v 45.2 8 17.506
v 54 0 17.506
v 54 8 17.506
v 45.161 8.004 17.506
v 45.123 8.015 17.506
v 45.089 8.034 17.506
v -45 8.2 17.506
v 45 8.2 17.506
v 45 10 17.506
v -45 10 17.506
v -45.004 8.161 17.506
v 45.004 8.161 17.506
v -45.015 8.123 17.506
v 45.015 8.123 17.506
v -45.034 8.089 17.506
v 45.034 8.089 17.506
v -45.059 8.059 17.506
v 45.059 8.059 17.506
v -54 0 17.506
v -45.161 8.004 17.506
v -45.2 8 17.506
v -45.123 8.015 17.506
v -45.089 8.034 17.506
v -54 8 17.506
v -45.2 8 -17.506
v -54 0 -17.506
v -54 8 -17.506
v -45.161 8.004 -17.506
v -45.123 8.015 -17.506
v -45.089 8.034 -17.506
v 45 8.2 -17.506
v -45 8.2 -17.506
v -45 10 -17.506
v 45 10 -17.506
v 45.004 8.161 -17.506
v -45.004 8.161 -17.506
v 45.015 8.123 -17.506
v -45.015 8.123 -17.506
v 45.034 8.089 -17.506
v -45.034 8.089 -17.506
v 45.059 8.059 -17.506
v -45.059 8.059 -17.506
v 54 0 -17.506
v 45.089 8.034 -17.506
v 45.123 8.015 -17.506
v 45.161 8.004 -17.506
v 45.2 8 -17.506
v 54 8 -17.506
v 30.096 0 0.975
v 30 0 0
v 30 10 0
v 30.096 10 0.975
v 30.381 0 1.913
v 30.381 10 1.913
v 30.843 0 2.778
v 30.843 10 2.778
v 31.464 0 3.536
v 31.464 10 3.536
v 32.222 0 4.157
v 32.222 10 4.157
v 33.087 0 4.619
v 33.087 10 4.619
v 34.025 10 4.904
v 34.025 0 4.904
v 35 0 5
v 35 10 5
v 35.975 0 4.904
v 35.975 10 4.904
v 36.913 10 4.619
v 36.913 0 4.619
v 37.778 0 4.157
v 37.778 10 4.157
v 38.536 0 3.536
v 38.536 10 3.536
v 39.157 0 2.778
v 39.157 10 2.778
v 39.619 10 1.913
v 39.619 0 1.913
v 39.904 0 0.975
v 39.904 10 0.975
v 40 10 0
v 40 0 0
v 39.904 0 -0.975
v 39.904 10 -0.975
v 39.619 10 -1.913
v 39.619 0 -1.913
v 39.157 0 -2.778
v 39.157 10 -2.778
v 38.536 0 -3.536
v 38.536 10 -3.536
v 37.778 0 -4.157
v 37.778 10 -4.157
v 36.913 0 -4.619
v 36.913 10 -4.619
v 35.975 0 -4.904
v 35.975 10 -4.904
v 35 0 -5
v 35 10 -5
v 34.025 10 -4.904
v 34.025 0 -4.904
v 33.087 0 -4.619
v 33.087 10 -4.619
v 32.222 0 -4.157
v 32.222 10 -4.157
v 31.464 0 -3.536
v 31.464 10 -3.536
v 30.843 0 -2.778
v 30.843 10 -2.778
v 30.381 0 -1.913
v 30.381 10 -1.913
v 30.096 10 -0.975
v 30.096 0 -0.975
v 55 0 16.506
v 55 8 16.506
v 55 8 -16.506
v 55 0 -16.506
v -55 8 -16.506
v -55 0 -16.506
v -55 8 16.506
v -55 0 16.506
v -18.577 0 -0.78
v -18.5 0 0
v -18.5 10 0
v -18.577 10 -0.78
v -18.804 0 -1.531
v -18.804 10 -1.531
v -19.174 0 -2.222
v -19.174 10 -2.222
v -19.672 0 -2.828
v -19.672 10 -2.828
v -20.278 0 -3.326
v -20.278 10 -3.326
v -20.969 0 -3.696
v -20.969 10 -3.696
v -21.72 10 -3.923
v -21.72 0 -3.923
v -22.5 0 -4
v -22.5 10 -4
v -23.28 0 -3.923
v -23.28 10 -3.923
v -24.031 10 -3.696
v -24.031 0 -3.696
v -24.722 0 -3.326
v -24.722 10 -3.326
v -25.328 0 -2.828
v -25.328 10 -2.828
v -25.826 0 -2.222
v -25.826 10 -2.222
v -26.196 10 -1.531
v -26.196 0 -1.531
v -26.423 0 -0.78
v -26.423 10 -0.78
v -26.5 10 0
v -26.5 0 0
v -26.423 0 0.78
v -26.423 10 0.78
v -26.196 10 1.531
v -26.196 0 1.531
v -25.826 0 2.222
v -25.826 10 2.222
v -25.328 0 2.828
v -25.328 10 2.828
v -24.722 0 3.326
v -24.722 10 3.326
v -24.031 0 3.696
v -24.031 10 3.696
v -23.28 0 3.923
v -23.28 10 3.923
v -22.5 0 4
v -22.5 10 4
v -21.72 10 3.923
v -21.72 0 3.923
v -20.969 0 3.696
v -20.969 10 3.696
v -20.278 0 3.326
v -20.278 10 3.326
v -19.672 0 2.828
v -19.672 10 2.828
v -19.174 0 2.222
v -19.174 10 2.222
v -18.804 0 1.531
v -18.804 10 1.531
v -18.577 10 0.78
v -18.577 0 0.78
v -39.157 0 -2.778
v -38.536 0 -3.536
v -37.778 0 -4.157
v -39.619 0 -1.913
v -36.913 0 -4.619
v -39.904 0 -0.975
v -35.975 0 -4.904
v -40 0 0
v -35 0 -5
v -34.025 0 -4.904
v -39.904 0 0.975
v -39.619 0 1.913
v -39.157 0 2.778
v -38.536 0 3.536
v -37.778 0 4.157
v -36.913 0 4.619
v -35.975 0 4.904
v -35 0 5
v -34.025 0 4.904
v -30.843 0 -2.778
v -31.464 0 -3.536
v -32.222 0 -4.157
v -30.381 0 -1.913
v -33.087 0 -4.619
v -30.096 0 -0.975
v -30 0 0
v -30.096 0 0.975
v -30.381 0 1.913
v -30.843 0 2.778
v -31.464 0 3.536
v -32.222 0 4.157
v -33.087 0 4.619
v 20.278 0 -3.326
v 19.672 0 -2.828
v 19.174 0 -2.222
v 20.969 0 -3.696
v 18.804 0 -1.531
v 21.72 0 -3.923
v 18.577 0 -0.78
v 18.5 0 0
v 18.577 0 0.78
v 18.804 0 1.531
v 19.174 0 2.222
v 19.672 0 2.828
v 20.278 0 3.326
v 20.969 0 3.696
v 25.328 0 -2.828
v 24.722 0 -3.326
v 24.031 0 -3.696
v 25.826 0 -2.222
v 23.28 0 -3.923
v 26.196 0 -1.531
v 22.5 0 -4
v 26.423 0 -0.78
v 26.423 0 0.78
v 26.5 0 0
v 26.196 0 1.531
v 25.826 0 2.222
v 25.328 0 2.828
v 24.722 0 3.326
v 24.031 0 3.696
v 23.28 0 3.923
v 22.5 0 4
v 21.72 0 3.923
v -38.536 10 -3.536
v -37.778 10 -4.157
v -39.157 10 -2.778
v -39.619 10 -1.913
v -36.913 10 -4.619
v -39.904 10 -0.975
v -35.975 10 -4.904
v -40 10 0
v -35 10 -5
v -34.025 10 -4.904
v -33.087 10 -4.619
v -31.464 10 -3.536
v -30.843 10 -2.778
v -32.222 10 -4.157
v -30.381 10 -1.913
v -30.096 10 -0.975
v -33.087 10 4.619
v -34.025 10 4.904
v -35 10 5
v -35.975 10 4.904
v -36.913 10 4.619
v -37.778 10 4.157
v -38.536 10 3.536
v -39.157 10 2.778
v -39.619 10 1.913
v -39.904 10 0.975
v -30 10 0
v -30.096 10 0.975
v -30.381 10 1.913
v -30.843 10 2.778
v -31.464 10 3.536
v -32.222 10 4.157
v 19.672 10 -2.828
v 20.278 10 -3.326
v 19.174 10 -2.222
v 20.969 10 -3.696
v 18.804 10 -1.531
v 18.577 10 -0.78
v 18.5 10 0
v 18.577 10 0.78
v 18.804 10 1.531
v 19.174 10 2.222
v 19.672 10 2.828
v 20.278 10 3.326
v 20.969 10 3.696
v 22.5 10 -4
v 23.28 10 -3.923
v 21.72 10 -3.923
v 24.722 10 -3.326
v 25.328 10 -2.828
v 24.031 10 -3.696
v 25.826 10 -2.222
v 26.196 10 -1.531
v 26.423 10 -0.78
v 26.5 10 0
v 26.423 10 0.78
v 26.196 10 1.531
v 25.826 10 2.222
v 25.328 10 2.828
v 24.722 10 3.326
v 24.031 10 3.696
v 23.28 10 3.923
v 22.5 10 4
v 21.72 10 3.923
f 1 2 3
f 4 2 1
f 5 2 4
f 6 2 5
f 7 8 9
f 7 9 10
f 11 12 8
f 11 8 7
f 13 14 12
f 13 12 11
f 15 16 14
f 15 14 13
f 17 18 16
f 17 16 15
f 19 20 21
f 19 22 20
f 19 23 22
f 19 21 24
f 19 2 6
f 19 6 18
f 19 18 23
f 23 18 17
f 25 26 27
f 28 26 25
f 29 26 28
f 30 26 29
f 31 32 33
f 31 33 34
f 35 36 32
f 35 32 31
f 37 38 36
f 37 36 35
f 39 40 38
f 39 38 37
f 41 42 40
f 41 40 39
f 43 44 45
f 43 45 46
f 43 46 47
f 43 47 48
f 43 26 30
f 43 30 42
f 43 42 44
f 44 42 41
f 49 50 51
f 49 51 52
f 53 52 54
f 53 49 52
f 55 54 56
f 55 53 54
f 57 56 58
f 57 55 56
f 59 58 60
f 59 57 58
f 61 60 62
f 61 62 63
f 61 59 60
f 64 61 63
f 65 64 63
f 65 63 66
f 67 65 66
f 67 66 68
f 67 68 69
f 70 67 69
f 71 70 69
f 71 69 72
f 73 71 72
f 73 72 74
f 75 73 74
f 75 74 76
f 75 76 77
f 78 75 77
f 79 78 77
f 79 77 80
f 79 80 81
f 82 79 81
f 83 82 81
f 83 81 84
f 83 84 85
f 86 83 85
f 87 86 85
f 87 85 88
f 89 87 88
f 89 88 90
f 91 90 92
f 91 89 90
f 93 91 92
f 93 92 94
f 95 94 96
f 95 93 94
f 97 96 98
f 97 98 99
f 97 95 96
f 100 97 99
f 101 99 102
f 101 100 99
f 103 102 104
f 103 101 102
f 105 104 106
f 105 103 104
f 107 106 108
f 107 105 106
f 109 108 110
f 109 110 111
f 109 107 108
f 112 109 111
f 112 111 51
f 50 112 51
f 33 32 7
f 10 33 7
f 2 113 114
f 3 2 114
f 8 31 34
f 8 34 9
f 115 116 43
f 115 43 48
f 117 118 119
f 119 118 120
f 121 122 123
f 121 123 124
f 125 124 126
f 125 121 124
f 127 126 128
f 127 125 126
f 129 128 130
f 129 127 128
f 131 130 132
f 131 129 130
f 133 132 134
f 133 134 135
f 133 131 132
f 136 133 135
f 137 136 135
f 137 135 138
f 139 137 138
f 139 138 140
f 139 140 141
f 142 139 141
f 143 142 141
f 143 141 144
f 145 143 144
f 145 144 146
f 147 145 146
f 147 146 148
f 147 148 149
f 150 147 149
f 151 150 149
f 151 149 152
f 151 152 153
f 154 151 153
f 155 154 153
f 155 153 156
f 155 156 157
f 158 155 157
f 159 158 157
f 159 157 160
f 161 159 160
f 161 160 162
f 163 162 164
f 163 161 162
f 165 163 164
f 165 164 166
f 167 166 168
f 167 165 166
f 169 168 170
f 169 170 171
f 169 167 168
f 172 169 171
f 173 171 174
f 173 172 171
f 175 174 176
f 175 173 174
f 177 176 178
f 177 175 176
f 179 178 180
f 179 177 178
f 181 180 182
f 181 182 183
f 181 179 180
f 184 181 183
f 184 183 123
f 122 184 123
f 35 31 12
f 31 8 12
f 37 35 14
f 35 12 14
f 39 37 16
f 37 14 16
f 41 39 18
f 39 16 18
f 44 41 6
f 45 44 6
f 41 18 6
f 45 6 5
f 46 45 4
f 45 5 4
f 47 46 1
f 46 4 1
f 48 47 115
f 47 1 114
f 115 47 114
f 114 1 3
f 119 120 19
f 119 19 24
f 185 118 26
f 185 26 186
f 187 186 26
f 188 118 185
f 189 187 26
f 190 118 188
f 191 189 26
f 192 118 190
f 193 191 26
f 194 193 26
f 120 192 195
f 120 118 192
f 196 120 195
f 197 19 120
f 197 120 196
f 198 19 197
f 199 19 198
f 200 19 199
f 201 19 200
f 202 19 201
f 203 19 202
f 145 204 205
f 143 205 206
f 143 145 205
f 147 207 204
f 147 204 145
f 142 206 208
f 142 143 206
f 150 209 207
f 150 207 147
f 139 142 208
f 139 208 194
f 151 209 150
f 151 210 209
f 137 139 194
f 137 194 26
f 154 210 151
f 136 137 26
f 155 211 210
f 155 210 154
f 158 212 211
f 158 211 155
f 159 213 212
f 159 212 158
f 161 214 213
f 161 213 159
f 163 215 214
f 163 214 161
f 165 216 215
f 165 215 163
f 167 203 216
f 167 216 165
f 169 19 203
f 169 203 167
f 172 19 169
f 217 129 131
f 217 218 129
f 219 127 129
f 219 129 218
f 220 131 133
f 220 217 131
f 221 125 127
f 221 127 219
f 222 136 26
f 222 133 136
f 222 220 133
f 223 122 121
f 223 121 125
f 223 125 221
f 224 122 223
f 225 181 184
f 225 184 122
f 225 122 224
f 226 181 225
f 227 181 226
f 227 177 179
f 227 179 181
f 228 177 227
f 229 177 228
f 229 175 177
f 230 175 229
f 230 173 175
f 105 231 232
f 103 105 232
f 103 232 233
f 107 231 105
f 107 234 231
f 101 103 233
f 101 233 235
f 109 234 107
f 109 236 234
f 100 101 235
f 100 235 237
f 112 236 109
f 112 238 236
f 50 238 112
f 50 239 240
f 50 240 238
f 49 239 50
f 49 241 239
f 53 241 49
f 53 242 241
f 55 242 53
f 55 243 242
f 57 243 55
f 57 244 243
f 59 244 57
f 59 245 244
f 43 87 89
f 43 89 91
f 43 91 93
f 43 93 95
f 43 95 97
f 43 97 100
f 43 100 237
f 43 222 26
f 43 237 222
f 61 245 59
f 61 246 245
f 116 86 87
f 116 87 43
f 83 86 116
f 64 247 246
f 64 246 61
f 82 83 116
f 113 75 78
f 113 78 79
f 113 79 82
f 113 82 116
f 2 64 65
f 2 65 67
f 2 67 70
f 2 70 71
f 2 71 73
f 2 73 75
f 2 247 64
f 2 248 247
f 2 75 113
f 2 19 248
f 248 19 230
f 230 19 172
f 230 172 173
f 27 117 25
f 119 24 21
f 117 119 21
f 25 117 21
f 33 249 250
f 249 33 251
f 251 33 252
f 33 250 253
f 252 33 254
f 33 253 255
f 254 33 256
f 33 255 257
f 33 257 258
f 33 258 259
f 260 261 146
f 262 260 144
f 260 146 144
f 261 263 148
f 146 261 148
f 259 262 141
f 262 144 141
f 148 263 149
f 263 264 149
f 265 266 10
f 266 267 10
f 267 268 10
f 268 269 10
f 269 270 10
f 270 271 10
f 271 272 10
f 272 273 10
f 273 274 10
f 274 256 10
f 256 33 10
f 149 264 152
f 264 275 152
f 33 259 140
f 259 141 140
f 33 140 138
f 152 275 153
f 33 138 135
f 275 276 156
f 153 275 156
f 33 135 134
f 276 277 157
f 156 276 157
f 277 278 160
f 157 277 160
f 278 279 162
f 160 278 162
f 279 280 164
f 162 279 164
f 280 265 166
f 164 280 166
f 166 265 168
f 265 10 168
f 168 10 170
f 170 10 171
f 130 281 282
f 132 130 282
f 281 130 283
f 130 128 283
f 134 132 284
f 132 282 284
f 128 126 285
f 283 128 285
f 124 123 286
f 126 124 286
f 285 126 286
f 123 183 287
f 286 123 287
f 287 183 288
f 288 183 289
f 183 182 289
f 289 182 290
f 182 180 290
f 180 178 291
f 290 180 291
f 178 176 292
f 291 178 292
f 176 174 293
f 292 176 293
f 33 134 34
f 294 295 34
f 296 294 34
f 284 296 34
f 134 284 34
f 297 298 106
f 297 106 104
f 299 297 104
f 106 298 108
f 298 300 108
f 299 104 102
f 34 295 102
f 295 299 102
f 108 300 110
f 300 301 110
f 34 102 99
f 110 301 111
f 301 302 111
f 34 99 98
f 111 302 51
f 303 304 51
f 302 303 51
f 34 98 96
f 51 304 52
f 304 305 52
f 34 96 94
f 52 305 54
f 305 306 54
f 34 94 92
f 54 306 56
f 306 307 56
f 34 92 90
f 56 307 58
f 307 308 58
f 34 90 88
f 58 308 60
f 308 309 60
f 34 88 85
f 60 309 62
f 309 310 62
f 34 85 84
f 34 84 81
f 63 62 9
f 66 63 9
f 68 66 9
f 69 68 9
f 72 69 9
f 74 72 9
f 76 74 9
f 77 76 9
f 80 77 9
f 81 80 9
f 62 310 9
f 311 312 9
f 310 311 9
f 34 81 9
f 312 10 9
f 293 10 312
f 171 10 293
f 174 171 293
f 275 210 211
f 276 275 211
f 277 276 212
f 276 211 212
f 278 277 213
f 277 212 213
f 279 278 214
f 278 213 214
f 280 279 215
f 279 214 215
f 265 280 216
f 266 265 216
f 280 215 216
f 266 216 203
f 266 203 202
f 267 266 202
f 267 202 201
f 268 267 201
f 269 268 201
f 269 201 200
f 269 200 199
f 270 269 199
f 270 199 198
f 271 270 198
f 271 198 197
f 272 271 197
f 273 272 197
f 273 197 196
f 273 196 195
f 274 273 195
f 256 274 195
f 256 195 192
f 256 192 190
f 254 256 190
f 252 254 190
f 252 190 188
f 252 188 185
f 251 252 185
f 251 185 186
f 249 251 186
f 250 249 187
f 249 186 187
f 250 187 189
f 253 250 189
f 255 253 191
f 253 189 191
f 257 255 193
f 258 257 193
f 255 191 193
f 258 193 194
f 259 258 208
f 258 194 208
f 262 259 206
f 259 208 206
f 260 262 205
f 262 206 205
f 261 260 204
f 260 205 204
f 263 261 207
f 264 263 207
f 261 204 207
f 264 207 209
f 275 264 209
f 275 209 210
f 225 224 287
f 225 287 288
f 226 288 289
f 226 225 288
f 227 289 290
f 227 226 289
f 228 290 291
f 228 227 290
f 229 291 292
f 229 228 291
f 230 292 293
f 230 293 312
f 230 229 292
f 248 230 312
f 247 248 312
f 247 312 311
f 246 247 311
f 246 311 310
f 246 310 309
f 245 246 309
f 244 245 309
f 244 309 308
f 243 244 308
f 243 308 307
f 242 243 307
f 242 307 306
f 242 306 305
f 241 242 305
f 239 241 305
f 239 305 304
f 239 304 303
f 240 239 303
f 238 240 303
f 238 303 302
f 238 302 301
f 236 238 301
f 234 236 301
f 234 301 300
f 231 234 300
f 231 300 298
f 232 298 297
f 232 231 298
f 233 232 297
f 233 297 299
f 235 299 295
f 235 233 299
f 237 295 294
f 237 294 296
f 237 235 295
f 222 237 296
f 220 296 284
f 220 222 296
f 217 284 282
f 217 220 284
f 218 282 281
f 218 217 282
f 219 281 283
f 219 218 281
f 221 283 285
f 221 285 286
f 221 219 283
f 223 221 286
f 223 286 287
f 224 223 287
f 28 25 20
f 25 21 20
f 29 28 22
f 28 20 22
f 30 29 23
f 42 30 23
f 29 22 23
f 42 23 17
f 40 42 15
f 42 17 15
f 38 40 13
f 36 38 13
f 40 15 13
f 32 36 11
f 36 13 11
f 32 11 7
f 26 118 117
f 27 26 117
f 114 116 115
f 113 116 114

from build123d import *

# Parameters (mm, degrees)
F0_W     = 10
F0_H     = 35.0110880776
F0_W_2   = 90
F0_R     = 5
F1_DEPTH = 8
F2_DEPTH = 10
F3_SIZE  = 1
F4_R     = 0.2


with BuildPart() as f1:
    # F0 (on Front) → F1 (new body)
    with BuildSketch(Plane.XZ):
        with Locations((-50, 0)):
            Rectangle(F0_W, F0_H)
        Rectangle(F0_W_2, F0_H)
        with Locations((-35, 0)):
            Circle(F0_R, mode=Mode.SUBTRACT)
        with BuildLine():
            ThreePointArc((-26.5, 0), (-22.5, 4), (-18.5, 0))
            ThreePointArc((-18.5, 0), (-22.5, -4), (-26.5, 0))
        make_face(mode=Mode.SUBTRACT)
        with BuildLine():
            ThreePointArc((26.5, 0), (22.5, -4), (18.5, 0))
            ThreePointArc((18.5, 0), (22.5, 4), (26.5, 0))
        make_face(mode=Mode.SUBTRACT)
        with BuildLine():
            ThreePointArc((40, 0), (35, -5), (30, 0))
            ThreePointArc((30, 0), (35, 5), (40, 0))
        make_face(mode=Mode.SUBTRACT)
        with Locations((50, 0)):
            Rectangle(F0_W, F0_H)
    extrude(amount=-F1_DEPTH)

    # F0 (on Front) → F2 (join)
    with BuildSketch(Plane.XZ):
        Rectangle(F0_W_2, F0_H)
        with Locations((-35, 0)):
            Circle(F0_R, mode=Mode.SUBTRACT)
        with BuildLine():
            ThreePointArc((-26.5, 0), (-22.5, 4), (-18.5, 0))
            ThreePointArc((-18.5, 0), (-22.5, -4), (-26.5, 0))
        make_face(mode=Mode.SUBTRACT)
        with BuildLine():
            ThreePointArc((26.5, 0), (22.5, -4), (18.5, 0))
            ThreePointArc((18.5, 0), (22.5, 4), (26.5, 0))
        make_face(mode=Mode.SUBTRACT)
        with BuildLine():
            ThreePointArc((40, 0), (35, -5), (30, 0))
            ThreePointArc((30, 0), (35, 5), (40, 0))
        make_face(mode=Mode.SUBTRACT)
    extrude(amount=-F2_DEPTH)

    # F3
    f3_edges = [f1.edges().sort_by_distance(p)[0] for p in [
        (55, 4, -17.505544),
        (55, 4, 17.505544),
        (-55, 4, -17.505544),
        (-55, 4, 17.505544),
    ]]
    chamfer(f3_edges, length=F3_SIZE)

    # F4
    f4_edges = [f1.edges().sort_by_distance(p)[0] for p in [
        (45, 8, 0),
        (-45, 8, 0),
    ]]
    fillet(f4_edges, radius=F4_R)


solid = f1.part
